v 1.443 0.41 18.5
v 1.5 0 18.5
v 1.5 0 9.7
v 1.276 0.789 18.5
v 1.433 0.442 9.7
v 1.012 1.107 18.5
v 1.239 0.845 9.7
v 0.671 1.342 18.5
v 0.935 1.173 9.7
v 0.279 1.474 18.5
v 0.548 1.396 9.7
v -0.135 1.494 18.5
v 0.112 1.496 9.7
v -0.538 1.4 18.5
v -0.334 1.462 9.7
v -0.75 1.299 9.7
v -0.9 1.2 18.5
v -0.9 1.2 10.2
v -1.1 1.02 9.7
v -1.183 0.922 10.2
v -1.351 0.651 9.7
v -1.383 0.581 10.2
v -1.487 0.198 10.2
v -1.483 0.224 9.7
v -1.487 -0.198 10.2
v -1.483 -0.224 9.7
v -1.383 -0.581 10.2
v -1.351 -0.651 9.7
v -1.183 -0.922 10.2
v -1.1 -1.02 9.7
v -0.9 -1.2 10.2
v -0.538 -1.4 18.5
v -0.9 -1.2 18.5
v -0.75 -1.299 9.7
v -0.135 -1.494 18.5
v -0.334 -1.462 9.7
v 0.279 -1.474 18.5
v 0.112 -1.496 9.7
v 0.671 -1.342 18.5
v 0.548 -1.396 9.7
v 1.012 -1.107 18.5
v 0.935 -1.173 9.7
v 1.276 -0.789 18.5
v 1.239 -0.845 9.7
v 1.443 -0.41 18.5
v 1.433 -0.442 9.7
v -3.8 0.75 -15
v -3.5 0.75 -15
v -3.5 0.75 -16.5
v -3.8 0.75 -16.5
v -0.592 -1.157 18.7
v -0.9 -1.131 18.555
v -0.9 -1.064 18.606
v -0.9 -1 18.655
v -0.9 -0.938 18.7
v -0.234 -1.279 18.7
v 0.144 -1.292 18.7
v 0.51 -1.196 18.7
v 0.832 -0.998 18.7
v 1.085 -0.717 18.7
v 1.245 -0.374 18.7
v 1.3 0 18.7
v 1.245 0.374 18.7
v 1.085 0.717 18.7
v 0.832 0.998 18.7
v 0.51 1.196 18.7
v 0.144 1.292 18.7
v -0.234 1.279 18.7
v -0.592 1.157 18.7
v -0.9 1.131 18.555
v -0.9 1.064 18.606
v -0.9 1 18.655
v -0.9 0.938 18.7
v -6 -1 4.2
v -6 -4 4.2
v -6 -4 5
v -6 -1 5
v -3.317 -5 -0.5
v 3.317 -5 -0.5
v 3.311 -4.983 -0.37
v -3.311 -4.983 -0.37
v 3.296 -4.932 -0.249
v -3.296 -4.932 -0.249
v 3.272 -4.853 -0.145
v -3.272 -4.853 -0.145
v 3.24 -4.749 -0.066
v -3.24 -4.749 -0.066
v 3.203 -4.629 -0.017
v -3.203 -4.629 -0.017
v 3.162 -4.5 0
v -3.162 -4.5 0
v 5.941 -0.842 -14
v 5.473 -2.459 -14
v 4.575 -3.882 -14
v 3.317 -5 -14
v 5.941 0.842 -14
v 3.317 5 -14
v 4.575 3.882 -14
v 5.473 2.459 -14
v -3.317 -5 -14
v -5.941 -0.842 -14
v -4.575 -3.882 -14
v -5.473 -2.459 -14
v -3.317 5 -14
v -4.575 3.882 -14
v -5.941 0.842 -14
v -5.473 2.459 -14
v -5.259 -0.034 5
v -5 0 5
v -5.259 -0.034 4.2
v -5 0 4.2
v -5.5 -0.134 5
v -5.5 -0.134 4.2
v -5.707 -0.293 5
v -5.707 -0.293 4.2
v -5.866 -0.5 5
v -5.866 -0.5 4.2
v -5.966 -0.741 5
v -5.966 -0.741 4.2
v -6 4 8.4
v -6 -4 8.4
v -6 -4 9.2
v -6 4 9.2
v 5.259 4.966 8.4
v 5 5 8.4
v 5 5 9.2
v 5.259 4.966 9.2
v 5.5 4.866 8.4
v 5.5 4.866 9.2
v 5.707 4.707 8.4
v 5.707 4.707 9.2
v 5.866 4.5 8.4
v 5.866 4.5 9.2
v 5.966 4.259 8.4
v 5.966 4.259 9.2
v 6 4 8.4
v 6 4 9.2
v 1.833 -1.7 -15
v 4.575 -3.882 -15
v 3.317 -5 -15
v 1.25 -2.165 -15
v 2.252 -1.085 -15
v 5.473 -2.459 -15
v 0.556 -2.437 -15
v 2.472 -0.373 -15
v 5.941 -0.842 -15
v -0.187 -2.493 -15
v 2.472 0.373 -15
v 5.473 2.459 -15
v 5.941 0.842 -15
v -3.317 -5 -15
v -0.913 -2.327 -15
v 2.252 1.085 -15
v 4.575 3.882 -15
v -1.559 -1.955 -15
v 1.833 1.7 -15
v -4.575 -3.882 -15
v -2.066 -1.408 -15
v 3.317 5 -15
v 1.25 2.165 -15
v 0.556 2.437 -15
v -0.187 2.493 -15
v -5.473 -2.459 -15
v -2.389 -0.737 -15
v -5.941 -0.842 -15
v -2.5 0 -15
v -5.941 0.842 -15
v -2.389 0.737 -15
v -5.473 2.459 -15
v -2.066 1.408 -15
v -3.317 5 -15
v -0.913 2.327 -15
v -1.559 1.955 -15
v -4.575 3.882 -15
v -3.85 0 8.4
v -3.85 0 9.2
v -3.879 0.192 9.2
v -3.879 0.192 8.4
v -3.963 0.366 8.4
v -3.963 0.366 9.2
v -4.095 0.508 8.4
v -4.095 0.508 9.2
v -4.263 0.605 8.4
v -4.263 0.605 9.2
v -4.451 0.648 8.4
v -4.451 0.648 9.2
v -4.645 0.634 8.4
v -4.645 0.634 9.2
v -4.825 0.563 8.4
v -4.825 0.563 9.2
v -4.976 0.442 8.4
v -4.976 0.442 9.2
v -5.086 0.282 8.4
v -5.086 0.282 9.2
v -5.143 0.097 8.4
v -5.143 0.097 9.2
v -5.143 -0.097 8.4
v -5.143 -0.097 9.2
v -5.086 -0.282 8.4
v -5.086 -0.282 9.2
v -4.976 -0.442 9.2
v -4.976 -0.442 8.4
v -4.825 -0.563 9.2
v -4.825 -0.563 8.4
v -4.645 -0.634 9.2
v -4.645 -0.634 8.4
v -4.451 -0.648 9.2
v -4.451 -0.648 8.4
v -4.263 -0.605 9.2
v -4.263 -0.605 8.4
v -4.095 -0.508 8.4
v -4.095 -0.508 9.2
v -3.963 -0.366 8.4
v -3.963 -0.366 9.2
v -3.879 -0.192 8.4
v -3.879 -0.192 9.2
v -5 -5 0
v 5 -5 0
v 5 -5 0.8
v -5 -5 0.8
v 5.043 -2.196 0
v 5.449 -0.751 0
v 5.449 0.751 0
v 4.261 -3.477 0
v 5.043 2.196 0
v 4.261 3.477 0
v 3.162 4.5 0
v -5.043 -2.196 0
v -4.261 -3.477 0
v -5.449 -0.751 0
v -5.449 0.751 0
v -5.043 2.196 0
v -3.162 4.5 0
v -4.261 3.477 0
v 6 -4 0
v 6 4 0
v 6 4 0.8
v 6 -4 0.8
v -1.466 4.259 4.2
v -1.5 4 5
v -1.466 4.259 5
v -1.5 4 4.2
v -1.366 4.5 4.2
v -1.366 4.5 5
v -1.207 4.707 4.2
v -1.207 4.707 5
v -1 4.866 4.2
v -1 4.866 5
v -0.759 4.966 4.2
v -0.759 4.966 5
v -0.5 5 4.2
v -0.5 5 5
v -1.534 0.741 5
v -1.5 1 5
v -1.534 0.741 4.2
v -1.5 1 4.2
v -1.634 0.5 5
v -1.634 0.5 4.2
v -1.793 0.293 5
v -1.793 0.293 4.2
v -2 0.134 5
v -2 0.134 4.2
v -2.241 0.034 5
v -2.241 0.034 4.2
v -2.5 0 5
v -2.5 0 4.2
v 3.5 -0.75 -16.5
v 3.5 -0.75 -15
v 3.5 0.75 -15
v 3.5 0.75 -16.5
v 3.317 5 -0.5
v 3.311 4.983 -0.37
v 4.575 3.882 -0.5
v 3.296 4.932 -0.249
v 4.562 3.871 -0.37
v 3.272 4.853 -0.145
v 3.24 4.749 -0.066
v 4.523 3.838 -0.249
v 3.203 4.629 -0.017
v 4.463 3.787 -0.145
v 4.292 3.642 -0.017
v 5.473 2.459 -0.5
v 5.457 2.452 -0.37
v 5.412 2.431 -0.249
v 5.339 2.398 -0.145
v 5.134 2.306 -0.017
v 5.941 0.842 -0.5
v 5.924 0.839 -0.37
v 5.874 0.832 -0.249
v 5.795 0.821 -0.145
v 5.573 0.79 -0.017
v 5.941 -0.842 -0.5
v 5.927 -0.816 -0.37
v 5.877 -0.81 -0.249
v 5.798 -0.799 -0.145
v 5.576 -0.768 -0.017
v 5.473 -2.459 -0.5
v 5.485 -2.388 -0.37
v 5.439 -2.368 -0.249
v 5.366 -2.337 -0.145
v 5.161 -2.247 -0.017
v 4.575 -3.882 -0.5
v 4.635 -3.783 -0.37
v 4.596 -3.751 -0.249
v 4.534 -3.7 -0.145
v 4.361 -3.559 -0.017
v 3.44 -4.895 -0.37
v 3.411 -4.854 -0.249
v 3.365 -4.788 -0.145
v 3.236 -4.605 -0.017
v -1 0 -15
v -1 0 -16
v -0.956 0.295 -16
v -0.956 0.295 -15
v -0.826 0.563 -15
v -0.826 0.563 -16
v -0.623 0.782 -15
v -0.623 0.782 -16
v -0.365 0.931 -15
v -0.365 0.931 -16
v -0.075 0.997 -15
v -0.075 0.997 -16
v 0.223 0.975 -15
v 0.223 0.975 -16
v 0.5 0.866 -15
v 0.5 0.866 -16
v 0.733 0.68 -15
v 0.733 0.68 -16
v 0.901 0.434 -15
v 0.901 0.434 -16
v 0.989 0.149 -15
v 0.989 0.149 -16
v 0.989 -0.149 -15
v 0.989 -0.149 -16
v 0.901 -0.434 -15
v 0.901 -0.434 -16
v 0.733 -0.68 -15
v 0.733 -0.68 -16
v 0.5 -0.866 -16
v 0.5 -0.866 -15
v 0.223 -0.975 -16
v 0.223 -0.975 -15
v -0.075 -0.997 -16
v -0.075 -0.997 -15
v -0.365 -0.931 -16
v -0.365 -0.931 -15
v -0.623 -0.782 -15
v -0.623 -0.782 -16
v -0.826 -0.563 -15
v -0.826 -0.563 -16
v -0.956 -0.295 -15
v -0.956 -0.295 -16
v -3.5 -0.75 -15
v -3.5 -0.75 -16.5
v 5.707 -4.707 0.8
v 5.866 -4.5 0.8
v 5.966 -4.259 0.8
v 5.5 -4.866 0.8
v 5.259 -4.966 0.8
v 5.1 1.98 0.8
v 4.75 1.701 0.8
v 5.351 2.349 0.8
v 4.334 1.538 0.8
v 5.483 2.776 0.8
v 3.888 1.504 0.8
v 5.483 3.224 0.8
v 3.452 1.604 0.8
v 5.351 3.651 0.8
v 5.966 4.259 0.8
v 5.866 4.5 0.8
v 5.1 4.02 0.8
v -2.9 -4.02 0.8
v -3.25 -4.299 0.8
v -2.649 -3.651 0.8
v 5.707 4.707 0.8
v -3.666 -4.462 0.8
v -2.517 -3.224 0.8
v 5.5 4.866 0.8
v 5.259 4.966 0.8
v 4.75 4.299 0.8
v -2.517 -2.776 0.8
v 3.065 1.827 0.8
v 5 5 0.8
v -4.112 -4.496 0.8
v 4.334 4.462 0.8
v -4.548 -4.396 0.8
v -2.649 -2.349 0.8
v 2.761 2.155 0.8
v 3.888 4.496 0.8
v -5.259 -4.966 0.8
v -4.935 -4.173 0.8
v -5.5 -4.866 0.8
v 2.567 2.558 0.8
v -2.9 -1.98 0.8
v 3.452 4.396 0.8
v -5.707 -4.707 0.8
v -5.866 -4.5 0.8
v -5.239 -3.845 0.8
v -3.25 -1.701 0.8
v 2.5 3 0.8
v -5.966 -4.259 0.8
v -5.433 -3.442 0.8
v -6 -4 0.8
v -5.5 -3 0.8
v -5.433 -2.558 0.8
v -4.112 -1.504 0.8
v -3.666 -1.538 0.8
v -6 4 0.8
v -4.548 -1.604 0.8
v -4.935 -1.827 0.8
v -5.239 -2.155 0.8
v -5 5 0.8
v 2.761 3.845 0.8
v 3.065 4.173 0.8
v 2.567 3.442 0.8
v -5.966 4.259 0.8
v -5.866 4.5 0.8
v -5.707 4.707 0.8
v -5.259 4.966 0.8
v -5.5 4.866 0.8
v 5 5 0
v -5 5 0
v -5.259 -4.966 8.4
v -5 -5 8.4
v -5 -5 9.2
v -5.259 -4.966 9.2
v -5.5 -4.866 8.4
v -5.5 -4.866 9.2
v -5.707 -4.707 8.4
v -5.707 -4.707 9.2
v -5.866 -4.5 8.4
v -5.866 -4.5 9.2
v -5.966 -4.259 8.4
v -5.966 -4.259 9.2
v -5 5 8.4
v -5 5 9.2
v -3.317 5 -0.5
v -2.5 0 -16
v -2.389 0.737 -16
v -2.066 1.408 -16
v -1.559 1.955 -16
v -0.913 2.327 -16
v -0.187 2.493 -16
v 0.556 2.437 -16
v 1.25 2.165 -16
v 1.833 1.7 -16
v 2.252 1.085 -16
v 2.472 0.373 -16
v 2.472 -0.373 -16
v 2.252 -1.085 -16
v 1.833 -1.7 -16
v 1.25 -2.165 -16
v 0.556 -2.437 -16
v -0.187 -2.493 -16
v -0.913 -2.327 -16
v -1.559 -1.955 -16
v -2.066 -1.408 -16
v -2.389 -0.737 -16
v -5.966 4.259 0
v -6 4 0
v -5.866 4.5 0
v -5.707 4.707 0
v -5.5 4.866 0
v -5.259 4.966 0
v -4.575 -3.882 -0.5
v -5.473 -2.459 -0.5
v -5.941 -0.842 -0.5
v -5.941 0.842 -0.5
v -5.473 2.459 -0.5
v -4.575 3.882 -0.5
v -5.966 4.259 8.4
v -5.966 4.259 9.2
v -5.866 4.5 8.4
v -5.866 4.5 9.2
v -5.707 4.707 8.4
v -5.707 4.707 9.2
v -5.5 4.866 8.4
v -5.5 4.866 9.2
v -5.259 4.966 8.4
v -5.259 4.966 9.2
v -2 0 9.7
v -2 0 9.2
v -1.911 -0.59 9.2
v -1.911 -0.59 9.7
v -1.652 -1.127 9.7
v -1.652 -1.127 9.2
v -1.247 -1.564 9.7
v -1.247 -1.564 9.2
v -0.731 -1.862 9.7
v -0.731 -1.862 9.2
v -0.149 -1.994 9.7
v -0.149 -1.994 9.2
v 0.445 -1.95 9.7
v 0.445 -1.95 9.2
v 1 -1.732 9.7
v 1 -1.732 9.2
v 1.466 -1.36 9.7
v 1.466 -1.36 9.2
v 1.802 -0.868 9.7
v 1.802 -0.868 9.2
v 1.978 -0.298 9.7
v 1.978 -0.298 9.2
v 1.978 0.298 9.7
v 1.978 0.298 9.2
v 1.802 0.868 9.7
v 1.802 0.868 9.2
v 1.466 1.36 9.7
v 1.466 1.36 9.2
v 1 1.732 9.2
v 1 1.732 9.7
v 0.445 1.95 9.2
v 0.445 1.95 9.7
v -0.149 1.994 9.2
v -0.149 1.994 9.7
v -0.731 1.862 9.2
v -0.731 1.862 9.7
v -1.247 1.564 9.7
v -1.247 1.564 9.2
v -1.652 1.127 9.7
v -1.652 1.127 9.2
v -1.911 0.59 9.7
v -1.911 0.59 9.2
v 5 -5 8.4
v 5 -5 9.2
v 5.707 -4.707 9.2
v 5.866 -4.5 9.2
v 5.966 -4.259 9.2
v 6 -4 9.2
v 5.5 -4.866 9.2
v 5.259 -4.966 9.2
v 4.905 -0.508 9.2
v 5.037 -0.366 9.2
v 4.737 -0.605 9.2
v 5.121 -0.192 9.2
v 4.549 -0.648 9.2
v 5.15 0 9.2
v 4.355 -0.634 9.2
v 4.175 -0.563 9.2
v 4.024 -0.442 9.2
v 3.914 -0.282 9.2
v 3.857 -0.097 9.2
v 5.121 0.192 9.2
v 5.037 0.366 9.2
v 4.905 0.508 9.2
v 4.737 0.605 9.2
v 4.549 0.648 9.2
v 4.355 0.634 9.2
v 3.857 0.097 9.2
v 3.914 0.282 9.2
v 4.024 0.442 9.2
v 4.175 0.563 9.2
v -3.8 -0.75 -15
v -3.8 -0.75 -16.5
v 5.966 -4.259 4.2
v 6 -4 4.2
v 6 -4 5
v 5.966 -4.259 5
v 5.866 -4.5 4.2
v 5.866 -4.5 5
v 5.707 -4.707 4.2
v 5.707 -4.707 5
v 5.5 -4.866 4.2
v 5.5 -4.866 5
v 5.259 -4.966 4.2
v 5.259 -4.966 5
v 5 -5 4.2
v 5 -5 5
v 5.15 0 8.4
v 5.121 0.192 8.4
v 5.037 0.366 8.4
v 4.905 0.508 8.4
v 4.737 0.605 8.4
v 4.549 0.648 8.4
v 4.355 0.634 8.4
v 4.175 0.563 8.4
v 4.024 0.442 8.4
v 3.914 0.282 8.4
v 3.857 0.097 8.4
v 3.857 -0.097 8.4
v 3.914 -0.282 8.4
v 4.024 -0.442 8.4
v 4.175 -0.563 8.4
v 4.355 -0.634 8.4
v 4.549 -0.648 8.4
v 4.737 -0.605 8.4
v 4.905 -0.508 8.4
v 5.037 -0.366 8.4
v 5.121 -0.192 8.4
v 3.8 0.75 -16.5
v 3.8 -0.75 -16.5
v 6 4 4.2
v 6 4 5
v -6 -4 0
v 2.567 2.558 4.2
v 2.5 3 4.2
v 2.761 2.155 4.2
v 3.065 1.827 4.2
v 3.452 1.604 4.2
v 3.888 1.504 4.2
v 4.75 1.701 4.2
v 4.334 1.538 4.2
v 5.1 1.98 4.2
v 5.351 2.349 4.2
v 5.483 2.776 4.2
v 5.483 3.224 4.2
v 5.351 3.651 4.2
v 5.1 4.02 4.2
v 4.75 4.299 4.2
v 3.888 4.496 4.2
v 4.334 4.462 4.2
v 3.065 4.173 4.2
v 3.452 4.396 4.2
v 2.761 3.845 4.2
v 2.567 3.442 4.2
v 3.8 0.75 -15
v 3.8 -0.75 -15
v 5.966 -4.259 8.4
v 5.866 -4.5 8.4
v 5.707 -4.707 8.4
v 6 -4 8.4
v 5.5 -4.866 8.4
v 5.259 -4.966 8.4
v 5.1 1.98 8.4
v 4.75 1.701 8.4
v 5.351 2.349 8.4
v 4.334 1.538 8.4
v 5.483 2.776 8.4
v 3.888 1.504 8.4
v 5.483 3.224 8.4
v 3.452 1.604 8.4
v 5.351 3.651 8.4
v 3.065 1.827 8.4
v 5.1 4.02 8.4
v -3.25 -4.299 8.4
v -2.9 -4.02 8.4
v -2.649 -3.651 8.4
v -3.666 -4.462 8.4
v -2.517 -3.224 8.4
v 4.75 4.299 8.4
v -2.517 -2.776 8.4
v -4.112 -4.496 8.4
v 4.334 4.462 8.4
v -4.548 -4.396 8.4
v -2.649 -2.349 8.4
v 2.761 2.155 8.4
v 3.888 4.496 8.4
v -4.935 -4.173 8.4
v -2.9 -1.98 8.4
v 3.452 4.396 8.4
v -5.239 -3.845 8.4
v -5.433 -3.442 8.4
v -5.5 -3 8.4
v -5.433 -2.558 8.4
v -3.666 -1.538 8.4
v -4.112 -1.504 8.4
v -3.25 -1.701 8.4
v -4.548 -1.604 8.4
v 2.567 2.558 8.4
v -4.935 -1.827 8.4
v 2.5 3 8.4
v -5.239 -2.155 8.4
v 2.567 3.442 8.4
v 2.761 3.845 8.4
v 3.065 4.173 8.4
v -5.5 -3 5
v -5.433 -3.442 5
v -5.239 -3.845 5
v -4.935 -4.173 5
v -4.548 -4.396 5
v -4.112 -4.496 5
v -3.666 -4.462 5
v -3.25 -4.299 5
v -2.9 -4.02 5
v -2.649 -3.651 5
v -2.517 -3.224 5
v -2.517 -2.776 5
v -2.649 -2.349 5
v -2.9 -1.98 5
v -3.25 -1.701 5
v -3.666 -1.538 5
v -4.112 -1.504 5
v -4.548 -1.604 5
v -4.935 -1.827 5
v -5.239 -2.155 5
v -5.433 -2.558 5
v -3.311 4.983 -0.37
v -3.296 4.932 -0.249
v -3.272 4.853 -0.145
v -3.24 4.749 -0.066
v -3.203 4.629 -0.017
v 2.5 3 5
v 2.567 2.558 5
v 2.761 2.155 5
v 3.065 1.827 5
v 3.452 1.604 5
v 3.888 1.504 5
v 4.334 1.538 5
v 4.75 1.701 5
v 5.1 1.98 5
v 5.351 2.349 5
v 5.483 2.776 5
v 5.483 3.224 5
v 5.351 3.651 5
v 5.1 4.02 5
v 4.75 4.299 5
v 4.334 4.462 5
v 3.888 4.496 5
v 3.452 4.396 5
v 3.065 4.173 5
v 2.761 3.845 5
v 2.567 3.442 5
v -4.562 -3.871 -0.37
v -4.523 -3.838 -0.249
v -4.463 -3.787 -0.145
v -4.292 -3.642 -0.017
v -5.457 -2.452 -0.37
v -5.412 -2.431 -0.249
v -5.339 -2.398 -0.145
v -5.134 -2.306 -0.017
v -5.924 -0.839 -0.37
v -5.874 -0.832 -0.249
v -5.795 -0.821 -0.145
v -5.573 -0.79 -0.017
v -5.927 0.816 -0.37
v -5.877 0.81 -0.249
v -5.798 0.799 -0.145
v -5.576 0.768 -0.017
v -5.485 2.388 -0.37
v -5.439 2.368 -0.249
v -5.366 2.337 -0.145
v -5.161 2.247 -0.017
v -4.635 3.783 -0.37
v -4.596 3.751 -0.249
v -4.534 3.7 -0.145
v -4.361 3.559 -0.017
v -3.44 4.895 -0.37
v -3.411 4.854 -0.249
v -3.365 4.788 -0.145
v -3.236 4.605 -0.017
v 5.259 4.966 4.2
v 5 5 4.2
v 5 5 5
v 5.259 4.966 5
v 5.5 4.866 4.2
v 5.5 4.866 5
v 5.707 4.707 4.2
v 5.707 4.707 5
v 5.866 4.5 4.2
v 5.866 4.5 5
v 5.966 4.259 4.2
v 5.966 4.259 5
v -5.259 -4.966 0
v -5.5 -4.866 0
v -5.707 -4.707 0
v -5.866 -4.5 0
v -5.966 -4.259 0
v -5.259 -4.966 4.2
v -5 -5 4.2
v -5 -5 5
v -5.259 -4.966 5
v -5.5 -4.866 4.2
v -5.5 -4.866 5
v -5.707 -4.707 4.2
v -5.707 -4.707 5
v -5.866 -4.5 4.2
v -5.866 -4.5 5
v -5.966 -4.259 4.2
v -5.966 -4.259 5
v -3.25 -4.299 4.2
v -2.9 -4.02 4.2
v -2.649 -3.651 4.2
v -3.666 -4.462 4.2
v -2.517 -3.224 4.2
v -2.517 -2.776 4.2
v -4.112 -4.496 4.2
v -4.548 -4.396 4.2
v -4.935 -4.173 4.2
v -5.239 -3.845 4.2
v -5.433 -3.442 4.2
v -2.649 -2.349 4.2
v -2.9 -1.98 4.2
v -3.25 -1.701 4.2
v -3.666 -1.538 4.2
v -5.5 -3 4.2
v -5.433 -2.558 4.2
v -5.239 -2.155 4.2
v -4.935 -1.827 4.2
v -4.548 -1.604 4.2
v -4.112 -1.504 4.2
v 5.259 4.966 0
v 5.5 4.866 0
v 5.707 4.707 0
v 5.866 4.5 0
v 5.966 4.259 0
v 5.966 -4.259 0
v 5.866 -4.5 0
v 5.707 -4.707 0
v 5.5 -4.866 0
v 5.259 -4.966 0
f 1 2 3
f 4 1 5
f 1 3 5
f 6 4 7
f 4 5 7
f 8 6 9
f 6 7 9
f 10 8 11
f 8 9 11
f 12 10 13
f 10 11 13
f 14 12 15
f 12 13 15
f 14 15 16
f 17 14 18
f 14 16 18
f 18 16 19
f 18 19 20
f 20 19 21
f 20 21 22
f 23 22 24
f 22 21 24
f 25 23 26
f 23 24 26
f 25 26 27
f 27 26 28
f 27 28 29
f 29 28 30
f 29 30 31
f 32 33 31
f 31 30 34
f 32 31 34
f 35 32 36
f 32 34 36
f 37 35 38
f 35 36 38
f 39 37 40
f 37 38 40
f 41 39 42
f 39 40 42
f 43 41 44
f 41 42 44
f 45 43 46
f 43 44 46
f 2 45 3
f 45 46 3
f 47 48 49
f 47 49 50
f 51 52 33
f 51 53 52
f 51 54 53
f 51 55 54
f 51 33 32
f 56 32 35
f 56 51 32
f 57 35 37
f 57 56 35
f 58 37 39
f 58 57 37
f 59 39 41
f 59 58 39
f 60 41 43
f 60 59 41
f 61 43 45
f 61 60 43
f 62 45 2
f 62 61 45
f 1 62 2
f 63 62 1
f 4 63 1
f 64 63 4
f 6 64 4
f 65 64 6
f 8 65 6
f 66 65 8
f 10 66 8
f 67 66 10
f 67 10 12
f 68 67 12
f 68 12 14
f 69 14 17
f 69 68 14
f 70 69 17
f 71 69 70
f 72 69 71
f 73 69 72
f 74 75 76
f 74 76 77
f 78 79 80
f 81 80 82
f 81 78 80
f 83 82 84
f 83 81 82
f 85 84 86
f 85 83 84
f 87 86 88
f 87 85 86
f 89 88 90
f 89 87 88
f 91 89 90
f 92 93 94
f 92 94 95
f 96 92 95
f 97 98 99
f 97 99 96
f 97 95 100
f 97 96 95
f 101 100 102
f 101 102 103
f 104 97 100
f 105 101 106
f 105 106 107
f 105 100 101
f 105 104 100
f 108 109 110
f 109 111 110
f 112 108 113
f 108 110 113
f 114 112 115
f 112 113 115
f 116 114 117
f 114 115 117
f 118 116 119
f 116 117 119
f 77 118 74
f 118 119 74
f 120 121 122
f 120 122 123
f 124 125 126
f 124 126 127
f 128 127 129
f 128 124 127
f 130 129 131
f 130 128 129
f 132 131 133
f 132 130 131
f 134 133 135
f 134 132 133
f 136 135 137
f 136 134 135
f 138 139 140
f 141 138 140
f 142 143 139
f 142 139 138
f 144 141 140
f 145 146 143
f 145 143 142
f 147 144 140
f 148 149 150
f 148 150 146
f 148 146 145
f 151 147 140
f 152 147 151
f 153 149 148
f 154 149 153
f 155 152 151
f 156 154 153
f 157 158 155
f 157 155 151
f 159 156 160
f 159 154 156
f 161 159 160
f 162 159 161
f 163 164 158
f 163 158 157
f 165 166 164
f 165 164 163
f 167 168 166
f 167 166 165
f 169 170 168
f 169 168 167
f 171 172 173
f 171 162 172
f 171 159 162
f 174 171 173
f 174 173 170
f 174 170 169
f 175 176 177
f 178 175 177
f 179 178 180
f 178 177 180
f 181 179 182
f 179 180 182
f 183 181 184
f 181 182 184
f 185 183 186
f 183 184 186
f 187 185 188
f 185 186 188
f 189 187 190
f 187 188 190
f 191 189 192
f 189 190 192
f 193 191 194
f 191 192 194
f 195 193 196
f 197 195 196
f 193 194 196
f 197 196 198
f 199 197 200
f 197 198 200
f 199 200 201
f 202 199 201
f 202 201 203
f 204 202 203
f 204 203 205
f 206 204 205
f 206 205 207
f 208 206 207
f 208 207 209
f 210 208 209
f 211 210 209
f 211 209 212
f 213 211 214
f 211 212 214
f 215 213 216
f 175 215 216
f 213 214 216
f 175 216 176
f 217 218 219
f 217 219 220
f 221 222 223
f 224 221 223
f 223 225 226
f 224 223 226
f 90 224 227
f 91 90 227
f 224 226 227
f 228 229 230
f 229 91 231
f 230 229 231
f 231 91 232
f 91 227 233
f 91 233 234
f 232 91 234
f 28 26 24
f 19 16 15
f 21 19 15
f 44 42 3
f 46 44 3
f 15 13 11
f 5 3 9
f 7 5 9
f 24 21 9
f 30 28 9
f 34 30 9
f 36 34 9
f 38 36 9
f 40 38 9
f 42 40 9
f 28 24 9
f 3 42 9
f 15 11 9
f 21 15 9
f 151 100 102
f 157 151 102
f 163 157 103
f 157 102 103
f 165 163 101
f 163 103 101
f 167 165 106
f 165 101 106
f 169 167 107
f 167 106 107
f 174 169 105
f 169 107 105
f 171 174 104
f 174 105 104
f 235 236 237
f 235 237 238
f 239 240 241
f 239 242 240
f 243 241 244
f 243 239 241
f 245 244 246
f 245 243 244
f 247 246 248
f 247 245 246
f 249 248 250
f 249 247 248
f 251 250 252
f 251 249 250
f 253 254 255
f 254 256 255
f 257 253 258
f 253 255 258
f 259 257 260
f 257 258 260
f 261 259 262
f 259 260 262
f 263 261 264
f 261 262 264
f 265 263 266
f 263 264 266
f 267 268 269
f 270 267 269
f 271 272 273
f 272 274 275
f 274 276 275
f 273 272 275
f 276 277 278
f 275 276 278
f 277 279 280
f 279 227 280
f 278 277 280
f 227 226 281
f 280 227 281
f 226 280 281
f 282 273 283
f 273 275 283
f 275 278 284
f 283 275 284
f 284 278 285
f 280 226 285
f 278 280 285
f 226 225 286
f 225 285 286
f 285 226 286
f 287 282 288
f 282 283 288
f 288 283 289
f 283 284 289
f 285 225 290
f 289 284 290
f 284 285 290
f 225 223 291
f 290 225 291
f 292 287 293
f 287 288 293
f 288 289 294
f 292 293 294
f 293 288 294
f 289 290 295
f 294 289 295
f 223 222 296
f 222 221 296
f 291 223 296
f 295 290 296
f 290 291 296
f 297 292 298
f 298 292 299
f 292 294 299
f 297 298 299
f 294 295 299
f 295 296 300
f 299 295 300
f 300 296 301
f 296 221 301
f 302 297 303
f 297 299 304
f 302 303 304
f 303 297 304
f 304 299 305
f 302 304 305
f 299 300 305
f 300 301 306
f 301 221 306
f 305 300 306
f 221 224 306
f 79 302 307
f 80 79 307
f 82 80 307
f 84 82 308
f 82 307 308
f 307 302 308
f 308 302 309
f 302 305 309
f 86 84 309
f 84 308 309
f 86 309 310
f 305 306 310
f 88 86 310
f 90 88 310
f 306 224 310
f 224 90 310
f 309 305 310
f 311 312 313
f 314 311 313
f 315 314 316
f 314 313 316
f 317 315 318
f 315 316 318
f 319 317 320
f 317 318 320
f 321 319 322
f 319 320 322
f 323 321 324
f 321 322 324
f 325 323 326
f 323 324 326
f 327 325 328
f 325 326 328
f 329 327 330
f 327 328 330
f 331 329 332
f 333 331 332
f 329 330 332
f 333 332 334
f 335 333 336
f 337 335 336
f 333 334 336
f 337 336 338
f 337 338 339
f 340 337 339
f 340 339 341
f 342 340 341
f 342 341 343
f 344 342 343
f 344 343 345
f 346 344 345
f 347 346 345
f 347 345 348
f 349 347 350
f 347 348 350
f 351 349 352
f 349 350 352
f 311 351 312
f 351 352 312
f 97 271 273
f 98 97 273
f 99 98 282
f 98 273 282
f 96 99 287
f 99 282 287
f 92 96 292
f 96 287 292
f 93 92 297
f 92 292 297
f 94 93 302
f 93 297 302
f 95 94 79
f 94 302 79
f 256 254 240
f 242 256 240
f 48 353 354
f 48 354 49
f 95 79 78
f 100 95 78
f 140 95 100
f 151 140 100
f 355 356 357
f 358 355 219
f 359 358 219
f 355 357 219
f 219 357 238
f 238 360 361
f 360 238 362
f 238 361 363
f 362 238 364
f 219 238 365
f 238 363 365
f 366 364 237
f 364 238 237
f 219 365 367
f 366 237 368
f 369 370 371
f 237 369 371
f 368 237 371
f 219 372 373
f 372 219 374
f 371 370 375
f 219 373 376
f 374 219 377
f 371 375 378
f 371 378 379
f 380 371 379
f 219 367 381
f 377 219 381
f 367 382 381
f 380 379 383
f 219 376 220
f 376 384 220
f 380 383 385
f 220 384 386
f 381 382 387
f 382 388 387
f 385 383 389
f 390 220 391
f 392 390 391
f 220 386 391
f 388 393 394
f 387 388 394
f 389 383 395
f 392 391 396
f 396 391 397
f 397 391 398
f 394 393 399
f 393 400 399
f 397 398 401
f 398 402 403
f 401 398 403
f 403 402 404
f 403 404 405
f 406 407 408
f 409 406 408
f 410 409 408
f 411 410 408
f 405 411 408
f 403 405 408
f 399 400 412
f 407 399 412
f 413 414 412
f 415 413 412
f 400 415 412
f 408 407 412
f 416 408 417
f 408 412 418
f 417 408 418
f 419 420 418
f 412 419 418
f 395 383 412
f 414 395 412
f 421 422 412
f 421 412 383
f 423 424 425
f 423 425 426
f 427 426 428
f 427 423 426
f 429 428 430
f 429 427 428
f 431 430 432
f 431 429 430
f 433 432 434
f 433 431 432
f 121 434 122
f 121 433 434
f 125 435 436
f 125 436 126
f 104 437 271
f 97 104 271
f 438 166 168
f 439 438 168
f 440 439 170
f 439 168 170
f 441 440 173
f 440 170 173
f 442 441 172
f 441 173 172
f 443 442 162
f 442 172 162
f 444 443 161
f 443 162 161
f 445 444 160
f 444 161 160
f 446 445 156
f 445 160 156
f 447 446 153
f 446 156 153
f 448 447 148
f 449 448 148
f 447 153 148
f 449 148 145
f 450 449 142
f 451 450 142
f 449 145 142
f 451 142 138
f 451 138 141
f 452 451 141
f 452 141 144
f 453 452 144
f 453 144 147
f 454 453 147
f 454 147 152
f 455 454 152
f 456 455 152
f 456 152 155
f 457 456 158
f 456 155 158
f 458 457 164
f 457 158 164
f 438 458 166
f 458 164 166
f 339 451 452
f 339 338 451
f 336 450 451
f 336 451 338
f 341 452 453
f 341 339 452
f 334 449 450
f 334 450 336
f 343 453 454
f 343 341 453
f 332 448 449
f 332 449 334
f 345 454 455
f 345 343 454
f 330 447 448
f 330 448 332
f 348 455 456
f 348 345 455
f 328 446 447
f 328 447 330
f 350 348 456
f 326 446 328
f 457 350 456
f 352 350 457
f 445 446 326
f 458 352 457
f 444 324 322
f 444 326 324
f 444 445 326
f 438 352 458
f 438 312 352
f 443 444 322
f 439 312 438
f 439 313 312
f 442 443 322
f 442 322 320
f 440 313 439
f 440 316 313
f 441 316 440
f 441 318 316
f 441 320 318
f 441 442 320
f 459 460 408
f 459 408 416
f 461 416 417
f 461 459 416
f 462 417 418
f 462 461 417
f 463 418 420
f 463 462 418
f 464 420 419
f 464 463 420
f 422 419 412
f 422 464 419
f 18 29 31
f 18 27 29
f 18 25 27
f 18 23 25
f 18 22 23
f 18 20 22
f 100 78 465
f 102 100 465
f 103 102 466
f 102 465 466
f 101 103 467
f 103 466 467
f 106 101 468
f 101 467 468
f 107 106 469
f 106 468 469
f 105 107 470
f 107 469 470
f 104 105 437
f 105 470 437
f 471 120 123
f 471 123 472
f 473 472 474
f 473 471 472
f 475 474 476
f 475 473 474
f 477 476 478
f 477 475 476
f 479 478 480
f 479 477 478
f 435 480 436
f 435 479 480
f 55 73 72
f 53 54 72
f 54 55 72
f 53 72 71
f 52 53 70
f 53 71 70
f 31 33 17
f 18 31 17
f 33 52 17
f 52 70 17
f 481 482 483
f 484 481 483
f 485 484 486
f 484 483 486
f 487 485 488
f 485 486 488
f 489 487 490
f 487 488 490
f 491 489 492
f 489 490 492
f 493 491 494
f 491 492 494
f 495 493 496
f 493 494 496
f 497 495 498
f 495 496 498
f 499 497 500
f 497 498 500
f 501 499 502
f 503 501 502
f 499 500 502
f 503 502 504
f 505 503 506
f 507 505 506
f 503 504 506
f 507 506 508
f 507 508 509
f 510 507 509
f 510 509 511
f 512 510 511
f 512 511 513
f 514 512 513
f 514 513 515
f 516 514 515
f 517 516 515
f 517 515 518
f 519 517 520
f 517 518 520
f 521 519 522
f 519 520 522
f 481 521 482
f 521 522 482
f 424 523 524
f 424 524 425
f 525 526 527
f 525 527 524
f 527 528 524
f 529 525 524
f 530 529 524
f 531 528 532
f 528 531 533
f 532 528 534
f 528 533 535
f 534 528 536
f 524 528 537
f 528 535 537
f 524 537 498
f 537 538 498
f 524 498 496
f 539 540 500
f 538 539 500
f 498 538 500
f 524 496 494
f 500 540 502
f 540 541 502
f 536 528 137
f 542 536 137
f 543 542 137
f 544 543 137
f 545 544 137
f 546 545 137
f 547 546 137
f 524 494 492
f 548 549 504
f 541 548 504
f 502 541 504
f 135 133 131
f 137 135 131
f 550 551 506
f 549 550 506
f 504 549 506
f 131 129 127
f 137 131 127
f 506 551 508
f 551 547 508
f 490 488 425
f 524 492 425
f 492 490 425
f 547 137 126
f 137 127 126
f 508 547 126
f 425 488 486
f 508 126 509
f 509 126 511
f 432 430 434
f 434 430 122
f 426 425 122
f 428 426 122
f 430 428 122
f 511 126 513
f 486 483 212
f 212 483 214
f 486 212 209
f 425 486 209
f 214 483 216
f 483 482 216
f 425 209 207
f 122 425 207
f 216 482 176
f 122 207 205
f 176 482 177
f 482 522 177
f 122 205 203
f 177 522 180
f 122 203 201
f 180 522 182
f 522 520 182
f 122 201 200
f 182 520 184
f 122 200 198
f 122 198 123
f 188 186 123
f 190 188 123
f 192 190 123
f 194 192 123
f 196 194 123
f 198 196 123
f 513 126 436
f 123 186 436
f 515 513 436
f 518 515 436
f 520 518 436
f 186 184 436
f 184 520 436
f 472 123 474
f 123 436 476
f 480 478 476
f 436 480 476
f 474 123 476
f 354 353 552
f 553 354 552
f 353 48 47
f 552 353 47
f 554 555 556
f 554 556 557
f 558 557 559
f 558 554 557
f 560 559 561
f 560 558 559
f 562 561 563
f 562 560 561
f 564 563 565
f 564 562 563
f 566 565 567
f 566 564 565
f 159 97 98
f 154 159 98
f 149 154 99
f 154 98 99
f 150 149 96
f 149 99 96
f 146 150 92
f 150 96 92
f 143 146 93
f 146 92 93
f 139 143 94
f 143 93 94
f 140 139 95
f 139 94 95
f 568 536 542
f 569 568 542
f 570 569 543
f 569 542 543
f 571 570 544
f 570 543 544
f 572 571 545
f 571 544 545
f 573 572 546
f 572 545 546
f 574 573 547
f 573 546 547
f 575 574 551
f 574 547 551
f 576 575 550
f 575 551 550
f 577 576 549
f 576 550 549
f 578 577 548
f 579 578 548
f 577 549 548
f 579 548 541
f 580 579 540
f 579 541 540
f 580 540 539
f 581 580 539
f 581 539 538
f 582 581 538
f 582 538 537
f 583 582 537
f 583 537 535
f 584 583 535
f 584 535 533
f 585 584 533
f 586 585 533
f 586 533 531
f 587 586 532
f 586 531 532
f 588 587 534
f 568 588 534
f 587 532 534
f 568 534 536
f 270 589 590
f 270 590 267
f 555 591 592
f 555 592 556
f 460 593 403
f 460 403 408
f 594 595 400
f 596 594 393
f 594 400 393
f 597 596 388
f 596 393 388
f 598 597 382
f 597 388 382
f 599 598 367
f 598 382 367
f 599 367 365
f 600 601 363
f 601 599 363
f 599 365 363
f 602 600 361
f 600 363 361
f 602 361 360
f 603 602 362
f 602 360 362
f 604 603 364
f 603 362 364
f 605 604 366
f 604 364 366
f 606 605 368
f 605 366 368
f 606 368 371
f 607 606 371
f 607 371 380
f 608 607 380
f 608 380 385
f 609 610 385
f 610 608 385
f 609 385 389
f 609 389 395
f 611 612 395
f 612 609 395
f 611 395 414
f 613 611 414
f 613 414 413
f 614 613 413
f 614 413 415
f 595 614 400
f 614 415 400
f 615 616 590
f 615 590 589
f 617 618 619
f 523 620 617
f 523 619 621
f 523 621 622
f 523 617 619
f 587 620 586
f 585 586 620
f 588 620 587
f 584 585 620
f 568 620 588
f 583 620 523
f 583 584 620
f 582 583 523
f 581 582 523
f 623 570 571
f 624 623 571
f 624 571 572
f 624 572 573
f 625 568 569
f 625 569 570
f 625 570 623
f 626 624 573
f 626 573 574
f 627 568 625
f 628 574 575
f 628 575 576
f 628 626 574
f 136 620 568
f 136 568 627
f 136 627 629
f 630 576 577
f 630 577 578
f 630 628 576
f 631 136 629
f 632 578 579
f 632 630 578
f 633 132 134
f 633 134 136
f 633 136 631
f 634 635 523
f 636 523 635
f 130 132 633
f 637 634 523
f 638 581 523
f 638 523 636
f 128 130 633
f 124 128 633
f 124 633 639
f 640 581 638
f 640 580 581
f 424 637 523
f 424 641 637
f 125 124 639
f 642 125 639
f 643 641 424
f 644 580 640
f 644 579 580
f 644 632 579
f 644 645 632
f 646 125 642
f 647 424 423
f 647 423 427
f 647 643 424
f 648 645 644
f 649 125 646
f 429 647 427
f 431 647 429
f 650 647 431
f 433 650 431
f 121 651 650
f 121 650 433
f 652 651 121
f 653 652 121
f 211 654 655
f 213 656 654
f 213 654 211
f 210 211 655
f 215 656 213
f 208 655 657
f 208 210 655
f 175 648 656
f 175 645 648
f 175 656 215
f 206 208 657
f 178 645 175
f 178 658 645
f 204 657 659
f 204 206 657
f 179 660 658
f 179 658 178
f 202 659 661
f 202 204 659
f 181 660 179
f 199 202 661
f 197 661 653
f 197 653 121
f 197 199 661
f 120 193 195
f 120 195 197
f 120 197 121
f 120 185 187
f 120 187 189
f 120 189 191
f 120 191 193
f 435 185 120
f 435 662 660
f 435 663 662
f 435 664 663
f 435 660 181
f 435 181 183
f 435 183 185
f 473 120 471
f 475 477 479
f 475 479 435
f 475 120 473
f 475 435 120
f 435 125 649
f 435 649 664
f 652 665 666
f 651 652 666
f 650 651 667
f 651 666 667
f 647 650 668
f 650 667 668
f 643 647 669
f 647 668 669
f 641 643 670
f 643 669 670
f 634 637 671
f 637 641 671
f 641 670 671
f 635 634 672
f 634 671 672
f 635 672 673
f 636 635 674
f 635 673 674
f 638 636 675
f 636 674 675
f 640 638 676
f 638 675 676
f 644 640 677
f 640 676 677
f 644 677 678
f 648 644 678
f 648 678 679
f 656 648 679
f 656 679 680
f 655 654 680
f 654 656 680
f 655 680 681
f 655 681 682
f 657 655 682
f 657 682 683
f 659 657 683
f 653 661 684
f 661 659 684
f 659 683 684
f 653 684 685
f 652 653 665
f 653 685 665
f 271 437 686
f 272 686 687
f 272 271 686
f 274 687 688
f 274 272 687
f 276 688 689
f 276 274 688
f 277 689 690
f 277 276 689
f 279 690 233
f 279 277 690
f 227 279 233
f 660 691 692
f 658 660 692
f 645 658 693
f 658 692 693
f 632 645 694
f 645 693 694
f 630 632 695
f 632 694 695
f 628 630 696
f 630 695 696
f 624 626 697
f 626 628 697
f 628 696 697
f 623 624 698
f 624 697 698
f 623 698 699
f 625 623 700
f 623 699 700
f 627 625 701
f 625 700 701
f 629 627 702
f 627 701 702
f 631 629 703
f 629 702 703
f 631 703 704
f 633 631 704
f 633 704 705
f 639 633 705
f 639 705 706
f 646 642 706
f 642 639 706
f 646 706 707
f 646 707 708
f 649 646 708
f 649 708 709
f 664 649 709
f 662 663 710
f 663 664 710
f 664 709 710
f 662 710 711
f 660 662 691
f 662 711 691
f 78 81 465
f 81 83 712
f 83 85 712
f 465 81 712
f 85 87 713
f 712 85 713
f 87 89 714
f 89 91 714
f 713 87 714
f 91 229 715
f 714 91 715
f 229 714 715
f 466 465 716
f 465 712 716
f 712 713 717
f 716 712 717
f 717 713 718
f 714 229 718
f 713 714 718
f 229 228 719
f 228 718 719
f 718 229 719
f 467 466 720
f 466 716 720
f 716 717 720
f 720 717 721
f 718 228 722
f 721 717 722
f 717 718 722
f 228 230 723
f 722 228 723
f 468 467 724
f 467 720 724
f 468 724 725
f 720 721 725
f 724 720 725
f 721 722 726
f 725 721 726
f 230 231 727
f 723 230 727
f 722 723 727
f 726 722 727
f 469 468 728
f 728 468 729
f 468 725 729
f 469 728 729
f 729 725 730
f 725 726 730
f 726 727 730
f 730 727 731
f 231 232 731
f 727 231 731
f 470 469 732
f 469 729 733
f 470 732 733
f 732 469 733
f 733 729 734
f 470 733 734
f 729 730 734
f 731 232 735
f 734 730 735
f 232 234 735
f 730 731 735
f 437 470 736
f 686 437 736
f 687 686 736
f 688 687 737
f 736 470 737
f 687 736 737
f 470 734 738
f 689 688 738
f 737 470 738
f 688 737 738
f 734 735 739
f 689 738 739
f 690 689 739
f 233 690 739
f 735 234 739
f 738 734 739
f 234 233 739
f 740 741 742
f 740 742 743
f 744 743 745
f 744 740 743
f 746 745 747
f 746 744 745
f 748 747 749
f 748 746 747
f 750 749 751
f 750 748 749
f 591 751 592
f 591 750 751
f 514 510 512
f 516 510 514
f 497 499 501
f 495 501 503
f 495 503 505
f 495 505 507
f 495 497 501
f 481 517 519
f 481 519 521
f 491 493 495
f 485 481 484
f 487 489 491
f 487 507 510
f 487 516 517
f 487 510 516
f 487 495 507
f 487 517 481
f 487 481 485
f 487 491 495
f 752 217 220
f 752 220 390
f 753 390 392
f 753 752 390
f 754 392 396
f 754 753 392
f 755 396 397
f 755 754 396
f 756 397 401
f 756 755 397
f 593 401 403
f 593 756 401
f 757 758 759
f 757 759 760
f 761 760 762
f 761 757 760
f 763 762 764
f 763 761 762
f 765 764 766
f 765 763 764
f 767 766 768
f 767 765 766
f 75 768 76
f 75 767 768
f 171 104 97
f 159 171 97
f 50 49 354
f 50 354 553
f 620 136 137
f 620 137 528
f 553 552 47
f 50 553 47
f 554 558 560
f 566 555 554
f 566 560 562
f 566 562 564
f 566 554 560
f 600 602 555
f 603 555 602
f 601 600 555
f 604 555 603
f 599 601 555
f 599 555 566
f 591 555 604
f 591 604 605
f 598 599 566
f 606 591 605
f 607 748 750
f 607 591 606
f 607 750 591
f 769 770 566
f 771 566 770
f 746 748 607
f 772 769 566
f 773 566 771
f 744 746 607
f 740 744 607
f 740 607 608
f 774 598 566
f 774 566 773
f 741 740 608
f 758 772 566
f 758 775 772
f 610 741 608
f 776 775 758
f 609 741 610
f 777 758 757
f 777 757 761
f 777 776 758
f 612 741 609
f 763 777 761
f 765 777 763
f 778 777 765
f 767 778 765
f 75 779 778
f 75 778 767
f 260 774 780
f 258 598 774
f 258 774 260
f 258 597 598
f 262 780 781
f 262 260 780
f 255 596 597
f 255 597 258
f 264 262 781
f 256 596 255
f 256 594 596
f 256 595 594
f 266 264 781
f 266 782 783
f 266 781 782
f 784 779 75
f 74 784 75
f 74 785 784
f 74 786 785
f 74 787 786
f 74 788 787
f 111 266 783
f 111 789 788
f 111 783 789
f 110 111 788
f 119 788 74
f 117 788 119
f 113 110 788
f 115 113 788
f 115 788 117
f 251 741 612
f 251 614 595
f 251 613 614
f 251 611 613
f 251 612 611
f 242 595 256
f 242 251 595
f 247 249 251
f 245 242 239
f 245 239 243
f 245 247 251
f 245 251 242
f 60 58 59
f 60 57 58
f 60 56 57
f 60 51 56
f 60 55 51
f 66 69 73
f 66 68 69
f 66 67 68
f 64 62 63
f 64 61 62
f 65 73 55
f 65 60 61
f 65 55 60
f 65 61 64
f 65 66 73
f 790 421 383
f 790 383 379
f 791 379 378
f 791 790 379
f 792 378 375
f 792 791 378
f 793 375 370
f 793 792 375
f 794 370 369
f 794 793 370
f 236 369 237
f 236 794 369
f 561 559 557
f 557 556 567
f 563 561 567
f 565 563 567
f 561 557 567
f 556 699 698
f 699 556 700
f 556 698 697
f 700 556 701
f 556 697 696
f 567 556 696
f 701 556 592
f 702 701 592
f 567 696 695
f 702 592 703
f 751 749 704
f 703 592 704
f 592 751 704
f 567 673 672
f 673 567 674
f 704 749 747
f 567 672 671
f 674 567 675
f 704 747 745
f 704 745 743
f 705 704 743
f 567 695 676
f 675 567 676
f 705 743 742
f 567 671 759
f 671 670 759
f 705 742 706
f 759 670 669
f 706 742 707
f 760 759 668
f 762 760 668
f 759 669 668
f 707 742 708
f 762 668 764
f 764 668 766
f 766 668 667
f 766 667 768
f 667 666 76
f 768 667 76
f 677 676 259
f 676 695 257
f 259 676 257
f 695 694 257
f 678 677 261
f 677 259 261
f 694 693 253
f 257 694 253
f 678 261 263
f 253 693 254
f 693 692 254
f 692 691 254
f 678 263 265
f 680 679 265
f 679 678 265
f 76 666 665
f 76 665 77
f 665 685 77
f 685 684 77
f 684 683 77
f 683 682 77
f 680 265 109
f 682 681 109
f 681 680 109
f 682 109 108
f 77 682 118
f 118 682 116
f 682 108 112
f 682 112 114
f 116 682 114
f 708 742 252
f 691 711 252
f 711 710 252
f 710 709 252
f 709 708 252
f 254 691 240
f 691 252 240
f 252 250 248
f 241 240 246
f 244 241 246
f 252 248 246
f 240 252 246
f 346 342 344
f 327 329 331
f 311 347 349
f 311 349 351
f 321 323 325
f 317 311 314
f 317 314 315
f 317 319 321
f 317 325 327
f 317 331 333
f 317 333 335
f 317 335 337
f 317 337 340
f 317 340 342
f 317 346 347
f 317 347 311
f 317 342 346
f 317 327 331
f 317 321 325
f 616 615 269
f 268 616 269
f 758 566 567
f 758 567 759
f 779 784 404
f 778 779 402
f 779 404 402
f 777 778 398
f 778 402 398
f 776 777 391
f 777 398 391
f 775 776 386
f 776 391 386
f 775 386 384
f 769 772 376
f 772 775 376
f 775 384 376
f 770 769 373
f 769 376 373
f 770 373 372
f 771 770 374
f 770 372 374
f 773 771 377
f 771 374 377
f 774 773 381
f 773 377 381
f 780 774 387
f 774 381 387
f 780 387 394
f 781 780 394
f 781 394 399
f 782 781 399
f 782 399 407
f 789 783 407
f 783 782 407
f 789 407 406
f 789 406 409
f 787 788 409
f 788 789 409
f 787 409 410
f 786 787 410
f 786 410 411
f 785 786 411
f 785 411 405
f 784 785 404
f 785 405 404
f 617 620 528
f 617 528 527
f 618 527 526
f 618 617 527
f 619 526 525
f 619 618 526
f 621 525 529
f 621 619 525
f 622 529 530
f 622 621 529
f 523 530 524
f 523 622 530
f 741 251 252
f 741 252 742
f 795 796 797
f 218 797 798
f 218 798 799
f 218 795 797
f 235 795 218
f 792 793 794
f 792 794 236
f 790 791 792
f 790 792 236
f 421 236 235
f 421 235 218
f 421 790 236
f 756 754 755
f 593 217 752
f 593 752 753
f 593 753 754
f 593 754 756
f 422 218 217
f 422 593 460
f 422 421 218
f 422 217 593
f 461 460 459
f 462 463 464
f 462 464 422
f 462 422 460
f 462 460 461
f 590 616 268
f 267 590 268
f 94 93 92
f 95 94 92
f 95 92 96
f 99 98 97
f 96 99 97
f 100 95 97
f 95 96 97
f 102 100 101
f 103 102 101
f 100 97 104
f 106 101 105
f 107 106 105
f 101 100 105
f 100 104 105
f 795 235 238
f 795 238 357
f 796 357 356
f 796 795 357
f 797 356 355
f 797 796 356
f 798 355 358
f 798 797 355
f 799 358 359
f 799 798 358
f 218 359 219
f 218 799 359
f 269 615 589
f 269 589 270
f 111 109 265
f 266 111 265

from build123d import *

# Parameters (mm, degrees)
BOSS_EXTRUDE1_DEPTH   = 14
BOSS_EXTRUDE2_DEPTH   = 1
SKETCH3_R             = 2.5
BOSS_EXTRUDE3_DEPTH   = 1
FILLET1_R             = 0.5
SKETCH4_W             = 0.3
SKETCH4_H             = 1.5
BOSS_EXTRUDE4_DEPTH   = 1.5
BOSS_EXTRUDE4_2_DEPTH = 1.5
SKETCH5_R             = 1
CUT_EXTRUDE1_DEPTH    = 1
BOSS_EXTRUDE5_DEPTH   = 0.8
LPATTERN1_COUNT       = 2
LPATTERN1_PITCH       = 4.2
LPATTERN2_COUNT       = 2
LPATTERN2_PITCH       = 8.4
BOSS_EXTRUDE6_REACH   = 20.981
SKETCH7_R             = 1.5
SKETCH8_R             = 2
BOSS_EXTRUDE7_DEPTH   = 0.5
SKETCH9_R             = 1.5
BOSS_EXTRUDE8_DEPTH   = 9
SKETCH10_W            = 0.6
SKETCH10_H            = 2.4
CUT_EXTRUDE2_DEPTH    = 8.5
CHAMFER1_SIZE         = 0.2
SKETCH11_R            = 0.65
CUT_EXTRUDE3_DEPTH    = 0.8
SKETCH12_W            = 4.5
SKETCH12_H            = 5
CUT_EXTRUDE4_DEPTH    = 0.8
FILLET2_R             = 1


with BuildPart() as part:
    # Sketch1 → Boss-Extrude1 (new body)
    with BuildSketch(Plane.XY):
        with BuildLine():
            Line((-3.31662479, 5), (3.31662479, 5))
            ThreePointArc((3.31662479, 5), (6, 0), (3.31662479, -5))
            Line((3.31662479, -5), (-3.31662479, -5))
            ThreePointArc((-3.31662479, -5), (-6, 0), (-3.31662479, 5))
        make_face()
    extrude(amount=-BOSS_EXTRUDE1_DEPTH)

    # Fillet1
    fillet1_edges = [part.edges().sort_by_distance(p)[0] for p in [
        (0, 5, 0),
        (6, 0, 0),
        (0, -5, 0),
        (-6, 0, 0),
    ]]
    fillet(fillet1_edges, radius=FILLET1_R)


with BuildPart() as body_2:
    # Sketch2 → Boss-Extrude2 (new body)
    with BuildSketch(Plane(origin=(0, 0, -14), x_dir=(-1, 0, 0), z_dir=(0, 0, -1))):
        with BuildLine():
            Line((3.31662479, 5), (-3.31662479, 5))
            ThreePointArc((-3.31662479, 5), (-6, 0), (-3.31662479, -5))
            Line((-3.31662479, -5), (3.31662479, -5))
            ThreePointArc((3.31662479, -5), (6, 0), (3.31662479, 5))
        make_face()
    extrude(amount=BOSS_EXTRUDE2_DEPTH)

    # Sketch3 → Boss-Extrude3 (add)
    with BuildSketch(Plane(origin=(0, 0, -15), x_dir=(-1, 0, 0), z_dir=(0, 0, -1))):
        Circle(SKETCH3_R)
    extrude(amount=BOSS_EXTRUDE3_DEPTH)

    # Sketch5 → Cut-Extrude1 (cut)
    with BuildSketch(Plane(origin=(0, 0, -16), x_dir=(-1, 0, 0), z_dir=(0, 0, -1))):
        Circle(SKETCH5_R)
    extrude(amount=-CUT_EXTRUDE1_DEPTH, mode=Mode.SUBTRACT)


with BuildPart() as body_3:
    # Sketch4 → Boss-Extrude4 (new body)
    with BuildSketch(Plane(origin=(0, 0, -15), x_dir=(-1, 0, 0), z_dir=(0, 0, -1))):
        with Locations((-3.65, 0)):
            Rectangle(SKETCH4_W, SKETCH4_H)
    extrude(amount=BOSS_EXTRUDE4_DEPTH)


with BuildPart() as body_4:
    # Sketch4 → Boss-Extrude4 2 (new body)
    with BuildSketch(Plane(origin=(0, 0, -15), x_dir=(-1, 0, 0), z_dir=(0, 0, -1))):
        with Locations((3.65, 0)):
            Rectangle(SKETCH4_W, SKETCH4_H)
    extrude(amount=BOSS_EXTRUDE4_2_DEPTH)


with BuildPart() as body_5:
    # Sketch6 → Boss-Extrude5 (new body)
    with BuildSketch(Plane.XY):
        with BuildLine():
            Line((-5, 5), (5, 5))
            ThreePointArc((5, 5), (5.707106781, 4.707106781), (6, 4))
            Line((6, 4), (6, -4))
            ThreePointArc((6, -4), (5.707106781, -4.707106781), (5, -5))
            Line((5, -5), (-5, -5))
            ThreePointArc((-5, -5), (-5.707106781, -4.707106781), (-6, -4))
            Line((-6, -4), (-6, 4))
            ThreePointArc((-6, 4), (-5.707106781, 4.707106781), (-5, 5))
        make_face()
    boss_extrude5 = extrude(amount=BOSS_EXTRUDE5_DEPTH)


with BuildPart() as lpattern1_1:
    # LPattern1: Boss-Extrude5 ×2
    with Locations(*[(0, 0, i * LPATTERN1_PITCH) for i in range(1, LPATTERN1_COUNT)]):
        add(boss_extrude5)


with BuildPart() as lpattern2_1:
    # LPattern2: Boss-Extrude5 ×2
    with Locations(*[(0, 0, i * LPATTERN2_PITCH) for i in range(1, LPATTERN2_COUNT)]):
        add(boss_extrude5)

    # Boss-Extrude6: up to this face of the body (flat: up to its plane)
    boss_extrude6_end = Plane(lpattern2_1.part.faces().sort_by_distance((0, 0, 9.2))[0])
    # Sketch7 → Boss-Extrude6 (add, up to the picked face)
    with BuildSketch(Plane.XY.offset(0.8), mode=Mode.PRIVATE) as boss_extrude6_sk1:
        with Locations(Location((4, 3, 0), (0, 0, 180))):
            Circle(SKETCH7_R)
    boss_extrude6_tool1 = split(extrude(boss_extrude6_sk1.sketch, amount=BOSS_EXTRUDE6_REACH, mode=Mode.PRIVATE), bisect_by=boss_extrude6_end, keep=Keep.BOTH, mode=Mode.PRIVATE)
    # Sketch7 → Boss-Extrude6 (add, up to the picked face)
    with BuildSketch(Plane.XY.offset(0.8), mode=Mode.PRIVATE) as boss_extrude6_sk2:
        with Locations(Location((-4, -3, 0), (0, 0, 180))):
            Circle(SKETCH7_R)
    boss_extrude6_tool2 = split(extrude(boss_extrude6_sk2.sketch, amount=BOSS_EXTRUDE6_REACH, mode=Mode.PRIVATE), bisect_by=boss_extrude6_end, keep=Keep.BOTH, mode=Mode.PRIVATE)

    add(body_5.part)  # Boss-Extrude6 merges body 5

    add(lpattern1_1.part)  # Boss-Extrude6 merges LPattern1_1
    add(boss_extrude6_tool1.solids().sort_by(Axis((4, 3, 0.8), (0, 0, 1)))[0])
    add(boss_extrude6_tool2.solids().sort_by(Axis((-4, -3, 0.8), (0, 0, 1)))[0])

    # Sketch8 → Boss-Extrude7 (add)
    with BuildSketch(Plane.XY.offset(9.2)):
        with Locations(Location((0, 0, 0), (0, 0, 180))):
            Circle(SKETCH8_R)
    extrude(amount=BOSS_EXTRUDE7_DEPTH)

    # Sketch11 → Cut-Extrude3 (cut)
    with BuildSketch(Plane.XY.offset(9.2)):
        with Locations((-4.5, 0)):
            Circle(SKETCH11_R)
        with Locations((4.5, 0)):
            Circle(SKETCH11_R)
    extrude(amount=-CUT_EXTRUDE3_DEPTH, mode=Mode.SUBTRACT)

    # Sketch12 → Cut-Extrude4 (cut)
    with BuildSketch(Plane.XY.offset(5)):
        with Locations((-3.75, 2.5)):
            Rectangle(SKETCH12_W, SKETCH12_H)
    extrude(amount=-CUT_EXTRUDE4_DEPTH, mode=Mode.SUBTRACT)

    # Fillet2
    fillet2_edges = [lpattern2_1.edges().sort_by_distance(p)[0] for p in [
        (-1.5, 0, 4.6),
        (-1.5, 5, 4.6),
        (-6, 0, 4.6),
    ]]
    fillet(fillet2_edges, radius=FILLET2_R)


with BuildPart() as body_6:
    # Sketch9 → Boss-Extrude8 (new body)
    with BuildSketch(Plane.XY.offset(9.7)):
        Circle(SKETCH9_R)
    extrude(amount=BOSS_EXTRUDE8_DEPTH)

    # Sketch10 → Cut-Extrude2 (cut)
    with BuildSketch(Plane.XY.offset(18.7)):
        with Locations((-1.2, 0)):
            Rectangle(SKETCH10_W, SKETCH10_H)
    extrude(amount=-CUT_EXTRUDE2_DEPTH, mode=Mode.SUBTRACT)

    # Chamfer1
    chamfer1_edges = [body_6.edges().sort_by_distance(p)[0] for p in [
        (0.670820393, 1.341640786, 18.7),
    ]]
    chamfer(chamfer1_edges, length=CHAMFER1_SIZE)


solid = Compound([part.part, body_2.part, body_3.part, body_4.part, lpattern2_1.part, body_6.part])
